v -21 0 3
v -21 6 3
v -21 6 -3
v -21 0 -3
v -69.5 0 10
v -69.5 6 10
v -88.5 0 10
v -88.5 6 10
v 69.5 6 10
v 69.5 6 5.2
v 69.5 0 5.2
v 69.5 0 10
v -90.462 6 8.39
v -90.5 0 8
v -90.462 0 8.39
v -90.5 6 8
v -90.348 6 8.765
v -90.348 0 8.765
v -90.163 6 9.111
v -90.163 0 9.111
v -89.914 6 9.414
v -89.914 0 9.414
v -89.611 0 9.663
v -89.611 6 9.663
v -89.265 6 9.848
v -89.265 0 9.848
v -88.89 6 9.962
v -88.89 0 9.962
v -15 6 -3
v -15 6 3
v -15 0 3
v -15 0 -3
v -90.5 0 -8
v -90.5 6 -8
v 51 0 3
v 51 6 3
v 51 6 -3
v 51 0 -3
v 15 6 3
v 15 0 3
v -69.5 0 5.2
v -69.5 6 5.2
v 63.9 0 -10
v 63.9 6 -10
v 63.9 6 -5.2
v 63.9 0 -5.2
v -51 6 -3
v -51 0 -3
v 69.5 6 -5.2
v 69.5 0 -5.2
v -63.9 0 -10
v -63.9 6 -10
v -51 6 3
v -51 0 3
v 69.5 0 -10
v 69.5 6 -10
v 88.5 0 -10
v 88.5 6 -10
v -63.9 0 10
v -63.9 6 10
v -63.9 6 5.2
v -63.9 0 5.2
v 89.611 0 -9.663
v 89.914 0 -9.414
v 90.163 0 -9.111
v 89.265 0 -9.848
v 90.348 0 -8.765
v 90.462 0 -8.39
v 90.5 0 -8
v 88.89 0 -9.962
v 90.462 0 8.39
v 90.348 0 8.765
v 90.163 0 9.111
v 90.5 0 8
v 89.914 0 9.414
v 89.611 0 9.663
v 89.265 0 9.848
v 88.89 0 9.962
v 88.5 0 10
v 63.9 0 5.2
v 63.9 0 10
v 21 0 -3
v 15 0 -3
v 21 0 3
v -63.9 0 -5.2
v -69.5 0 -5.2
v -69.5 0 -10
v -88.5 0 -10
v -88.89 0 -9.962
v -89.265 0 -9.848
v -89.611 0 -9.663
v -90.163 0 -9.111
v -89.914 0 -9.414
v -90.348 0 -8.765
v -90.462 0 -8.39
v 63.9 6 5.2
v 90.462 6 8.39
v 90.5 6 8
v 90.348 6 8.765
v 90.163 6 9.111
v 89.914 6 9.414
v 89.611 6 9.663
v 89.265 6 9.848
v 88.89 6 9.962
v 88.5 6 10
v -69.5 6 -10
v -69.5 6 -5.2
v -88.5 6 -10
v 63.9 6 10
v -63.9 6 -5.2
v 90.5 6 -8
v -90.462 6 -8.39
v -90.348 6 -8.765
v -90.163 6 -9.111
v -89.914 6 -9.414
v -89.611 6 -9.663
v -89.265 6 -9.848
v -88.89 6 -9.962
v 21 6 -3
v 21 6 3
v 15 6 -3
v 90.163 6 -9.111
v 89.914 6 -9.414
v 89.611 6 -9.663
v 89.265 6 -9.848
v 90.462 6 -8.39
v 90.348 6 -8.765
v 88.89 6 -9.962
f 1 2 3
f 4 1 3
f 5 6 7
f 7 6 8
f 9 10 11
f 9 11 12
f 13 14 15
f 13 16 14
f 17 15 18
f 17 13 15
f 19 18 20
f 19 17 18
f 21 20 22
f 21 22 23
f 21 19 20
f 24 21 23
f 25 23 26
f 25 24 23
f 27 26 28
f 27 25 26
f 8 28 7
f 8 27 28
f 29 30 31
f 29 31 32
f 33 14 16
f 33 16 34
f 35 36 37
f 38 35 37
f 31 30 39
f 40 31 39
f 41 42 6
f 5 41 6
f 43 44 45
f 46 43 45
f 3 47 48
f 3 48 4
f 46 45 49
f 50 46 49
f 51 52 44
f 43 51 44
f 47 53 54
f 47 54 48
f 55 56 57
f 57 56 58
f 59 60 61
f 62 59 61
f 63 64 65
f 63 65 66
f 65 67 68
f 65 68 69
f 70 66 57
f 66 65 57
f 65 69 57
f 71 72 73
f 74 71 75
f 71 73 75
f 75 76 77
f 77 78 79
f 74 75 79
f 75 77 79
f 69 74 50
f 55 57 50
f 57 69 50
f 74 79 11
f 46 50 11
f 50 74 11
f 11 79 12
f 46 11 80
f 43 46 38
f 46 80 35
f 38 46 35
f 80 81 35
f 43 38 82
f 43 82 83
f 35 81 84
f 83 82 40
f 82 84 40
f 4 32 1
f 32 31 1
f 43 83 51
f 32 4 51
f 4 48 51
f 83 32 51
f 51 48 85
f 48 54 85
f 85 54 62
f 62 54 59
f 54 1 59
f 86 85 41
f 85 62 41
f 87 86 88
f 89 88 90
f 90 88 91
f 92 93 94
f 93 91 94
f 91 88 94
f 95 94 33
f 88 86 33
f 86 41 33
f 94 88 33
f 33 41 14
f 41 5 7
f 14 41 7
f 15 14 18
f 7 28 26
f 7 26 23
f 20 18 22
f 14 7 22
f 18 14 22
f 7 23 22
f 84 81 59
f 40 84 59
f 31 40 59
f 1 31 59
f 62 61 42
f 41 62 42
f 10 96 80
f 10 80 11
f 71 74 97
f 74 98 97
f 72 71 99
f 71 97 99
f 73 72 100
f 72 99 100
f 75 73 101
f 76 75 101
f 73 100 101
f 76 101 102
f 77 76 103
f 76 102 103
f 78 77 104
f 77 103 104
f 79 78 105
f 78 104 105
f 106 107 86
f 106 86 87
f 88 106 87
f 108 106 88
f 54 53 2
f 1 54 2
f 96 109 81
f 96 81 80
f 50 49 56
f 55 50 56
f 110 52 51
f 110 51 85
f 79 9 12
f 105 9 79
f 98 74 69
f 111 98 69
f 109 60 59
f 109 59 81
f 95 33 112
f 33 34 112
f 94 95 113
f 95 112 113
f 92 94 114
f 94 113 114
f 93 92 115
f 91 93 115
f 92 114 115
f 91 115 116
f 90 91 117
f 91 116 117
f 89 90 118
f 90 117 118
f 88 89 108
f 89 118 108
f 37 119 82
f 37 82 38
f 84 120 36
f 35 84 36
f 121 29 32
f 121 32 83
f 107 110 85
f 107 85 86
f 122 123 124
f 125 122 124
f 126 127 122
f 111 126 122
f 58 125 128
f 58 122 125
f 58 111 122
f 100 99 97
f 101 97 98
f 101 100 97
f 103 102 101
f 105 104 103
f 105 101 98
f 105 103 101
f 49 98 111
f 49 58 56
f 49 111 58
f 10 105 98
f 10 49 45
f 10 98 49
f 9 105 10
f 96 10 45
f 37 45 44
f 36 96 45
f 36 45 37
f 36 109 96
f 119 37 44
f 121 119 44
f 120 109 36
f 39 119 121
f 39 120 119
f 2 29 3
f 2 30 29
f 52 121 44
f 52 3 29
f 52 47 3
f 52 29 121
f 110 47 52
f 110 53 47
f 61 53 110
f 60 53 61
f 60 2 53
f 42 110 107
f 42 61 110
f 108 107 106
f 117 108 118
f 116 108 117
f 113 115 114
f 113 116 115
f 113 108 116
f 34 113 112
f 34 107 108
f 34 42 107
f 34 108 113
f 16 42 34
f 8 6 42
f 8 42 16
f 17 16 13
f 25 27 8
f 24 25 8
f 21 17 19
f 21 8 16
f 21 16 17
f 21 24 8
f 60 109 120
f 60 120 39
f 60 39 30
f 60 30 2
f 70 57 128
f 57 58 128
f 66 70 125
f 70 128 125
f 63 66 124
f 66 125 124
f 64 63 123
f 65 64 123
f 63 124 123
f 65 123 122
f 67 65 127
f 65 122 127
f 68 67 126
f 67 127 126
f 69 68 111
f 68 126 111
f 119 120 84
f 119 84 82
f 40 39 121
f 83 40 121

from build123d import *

# Parameters (mm, degrees)
SKETCH1_W                                = 181
SKETCH1_H                                = 20
BOSS_EXTRUDE1_DEPTH                      = 6
SKETCH3_W                                = 30
SKETCH3_H                                = 6
CUT_EXTRUDE1_DEPTH                       = 7
SKETCH4_W                                = 6
SKETCH4_H                                = 5
CUT_EXTRUDE2_DEPTH                       = 7
FILLET1_R                                = 2
BOSS_EXTRUDE2_DEPTH                      = 6
MIRROR2_AT_THE_SECOND_PLANE_COPY_1_DEPTH = 6


with BuildPart() as part:
    # Sketch1 → Boss-Extrude1 (new body)
    with BuildSketch(Plane(origin=(0, 0, 0), x_dir=(1, 0, 0), z_dir=(0, 1, 0))):
        Rectangle(SKETCH1_W, SKETCH1_H)
    extrude(amount=BOSS_EXTRUDE1_DEPTH)

    # Sketch3 → Cut-Extrude1 (cut, through all)
    with BuildSketch(Plane(origin=(0, 6, 0), x_dir=(1, 0, 0), z_dir=(0, 1, 0))):
        with Locations((36, 0)):
            Rectangle(SKETCH3_W, SKETCH3_H)
        Rectangle(SKETCH3_W, SKETCH3_H)
        with Locations((-36, 0)):
            Rectangle(SKETCH3_W, SKETCH3_H)
    extrude(amount=-CUT_EXTRUDE1_DEPTH, mode=Mode.SUBTRACT)

    # Sketch4 → Cut-Extrude2 (cut, through all)
    with BuildSketch(Plane.XZ):
        with Locations((-66.7, 7.5)):
            Rectangle(SKETCH4_W, SKETCH4_H)
        with Locations((-66.7, -7.5)):
            Rectangle(SKETCH4_W, SKETCH4_H)
    cut_extrude2 = extrude(amount=-CUT_EXTRUDE2_DEPTH, mode=Mode.SUBTRACT)

    # Mirror1: Cut-Extrude2 across plane
    add(cut_extrude2.mirror(Plane(origin=(0, 0, 0), x_dir=(0, 0, 1), z_dir=(1, 0, 0))), mode=Mode.SUBTRACT)

    # Fillet1
    fillet1_edges = [part.edges().sort_by_distance(p)[0] for p in [
        (-90.5, 3, -10),
        (-90.5, 3, 10),
        (90.5, 3, 10),
        (90.5, 3, -10),
    ]]
    fillet(fillet1_edges, radius=FILLET1_R)

    # Sketch5 → Boss-Extrude2 (add)
    with BuildSketch(Plane(origin=(0, 6, 0), x_dir=(1, 0, 0), z_dir=(0, 1, 0))):
        Polygon((-69.5, 5.2), (-69.5, 9.8), (-69.5, 10), (-69.7, 10), (-69.7, 5), (-63.7, 5), (-63.7, 10), (-63.9, 10), (-63.9, 9.8), (-63.9, 5.2), align=None)
    boss_extrude2 = extrude(amount=-BOSS_EXTRUDE2_DEPTH)

    # Mirror2: Boss-Extrude2 across plane
    add(boss_extrude2.mirror(Plane(origin=(0, 0, 0), x_dir=(0, 0, 1), z_dir=(1, 0, 0))))

    # Mirror2 at the second plane: Boss-Extrude2 across plane
    add(boss_extrude2.mirror(Plane.XY))

    # Mirror2 at the second plane copy 1 sketc → Mirror2 at the second plane copy 1 (add)
    with BuildSketch(Plane(origin=(0, 6, 0), x_dir=(-1, 0, 0), z_dir=(0, 1, 0))):
        Polygon((-69.5, 5.2), (-69.5, 9.8), (-69.5, 10), (-69.7, 10), (-69.7, 5), (-63.7, 5), (-63.7, 10), (-63.9, 10), (-63.9, 9.8), (-63.9, 5.2), align=None)
    extrude(amount=-MIRROR2_AT_THE_SECOND_PLANE_COPY_1_DEPTH)


solid = part.part
